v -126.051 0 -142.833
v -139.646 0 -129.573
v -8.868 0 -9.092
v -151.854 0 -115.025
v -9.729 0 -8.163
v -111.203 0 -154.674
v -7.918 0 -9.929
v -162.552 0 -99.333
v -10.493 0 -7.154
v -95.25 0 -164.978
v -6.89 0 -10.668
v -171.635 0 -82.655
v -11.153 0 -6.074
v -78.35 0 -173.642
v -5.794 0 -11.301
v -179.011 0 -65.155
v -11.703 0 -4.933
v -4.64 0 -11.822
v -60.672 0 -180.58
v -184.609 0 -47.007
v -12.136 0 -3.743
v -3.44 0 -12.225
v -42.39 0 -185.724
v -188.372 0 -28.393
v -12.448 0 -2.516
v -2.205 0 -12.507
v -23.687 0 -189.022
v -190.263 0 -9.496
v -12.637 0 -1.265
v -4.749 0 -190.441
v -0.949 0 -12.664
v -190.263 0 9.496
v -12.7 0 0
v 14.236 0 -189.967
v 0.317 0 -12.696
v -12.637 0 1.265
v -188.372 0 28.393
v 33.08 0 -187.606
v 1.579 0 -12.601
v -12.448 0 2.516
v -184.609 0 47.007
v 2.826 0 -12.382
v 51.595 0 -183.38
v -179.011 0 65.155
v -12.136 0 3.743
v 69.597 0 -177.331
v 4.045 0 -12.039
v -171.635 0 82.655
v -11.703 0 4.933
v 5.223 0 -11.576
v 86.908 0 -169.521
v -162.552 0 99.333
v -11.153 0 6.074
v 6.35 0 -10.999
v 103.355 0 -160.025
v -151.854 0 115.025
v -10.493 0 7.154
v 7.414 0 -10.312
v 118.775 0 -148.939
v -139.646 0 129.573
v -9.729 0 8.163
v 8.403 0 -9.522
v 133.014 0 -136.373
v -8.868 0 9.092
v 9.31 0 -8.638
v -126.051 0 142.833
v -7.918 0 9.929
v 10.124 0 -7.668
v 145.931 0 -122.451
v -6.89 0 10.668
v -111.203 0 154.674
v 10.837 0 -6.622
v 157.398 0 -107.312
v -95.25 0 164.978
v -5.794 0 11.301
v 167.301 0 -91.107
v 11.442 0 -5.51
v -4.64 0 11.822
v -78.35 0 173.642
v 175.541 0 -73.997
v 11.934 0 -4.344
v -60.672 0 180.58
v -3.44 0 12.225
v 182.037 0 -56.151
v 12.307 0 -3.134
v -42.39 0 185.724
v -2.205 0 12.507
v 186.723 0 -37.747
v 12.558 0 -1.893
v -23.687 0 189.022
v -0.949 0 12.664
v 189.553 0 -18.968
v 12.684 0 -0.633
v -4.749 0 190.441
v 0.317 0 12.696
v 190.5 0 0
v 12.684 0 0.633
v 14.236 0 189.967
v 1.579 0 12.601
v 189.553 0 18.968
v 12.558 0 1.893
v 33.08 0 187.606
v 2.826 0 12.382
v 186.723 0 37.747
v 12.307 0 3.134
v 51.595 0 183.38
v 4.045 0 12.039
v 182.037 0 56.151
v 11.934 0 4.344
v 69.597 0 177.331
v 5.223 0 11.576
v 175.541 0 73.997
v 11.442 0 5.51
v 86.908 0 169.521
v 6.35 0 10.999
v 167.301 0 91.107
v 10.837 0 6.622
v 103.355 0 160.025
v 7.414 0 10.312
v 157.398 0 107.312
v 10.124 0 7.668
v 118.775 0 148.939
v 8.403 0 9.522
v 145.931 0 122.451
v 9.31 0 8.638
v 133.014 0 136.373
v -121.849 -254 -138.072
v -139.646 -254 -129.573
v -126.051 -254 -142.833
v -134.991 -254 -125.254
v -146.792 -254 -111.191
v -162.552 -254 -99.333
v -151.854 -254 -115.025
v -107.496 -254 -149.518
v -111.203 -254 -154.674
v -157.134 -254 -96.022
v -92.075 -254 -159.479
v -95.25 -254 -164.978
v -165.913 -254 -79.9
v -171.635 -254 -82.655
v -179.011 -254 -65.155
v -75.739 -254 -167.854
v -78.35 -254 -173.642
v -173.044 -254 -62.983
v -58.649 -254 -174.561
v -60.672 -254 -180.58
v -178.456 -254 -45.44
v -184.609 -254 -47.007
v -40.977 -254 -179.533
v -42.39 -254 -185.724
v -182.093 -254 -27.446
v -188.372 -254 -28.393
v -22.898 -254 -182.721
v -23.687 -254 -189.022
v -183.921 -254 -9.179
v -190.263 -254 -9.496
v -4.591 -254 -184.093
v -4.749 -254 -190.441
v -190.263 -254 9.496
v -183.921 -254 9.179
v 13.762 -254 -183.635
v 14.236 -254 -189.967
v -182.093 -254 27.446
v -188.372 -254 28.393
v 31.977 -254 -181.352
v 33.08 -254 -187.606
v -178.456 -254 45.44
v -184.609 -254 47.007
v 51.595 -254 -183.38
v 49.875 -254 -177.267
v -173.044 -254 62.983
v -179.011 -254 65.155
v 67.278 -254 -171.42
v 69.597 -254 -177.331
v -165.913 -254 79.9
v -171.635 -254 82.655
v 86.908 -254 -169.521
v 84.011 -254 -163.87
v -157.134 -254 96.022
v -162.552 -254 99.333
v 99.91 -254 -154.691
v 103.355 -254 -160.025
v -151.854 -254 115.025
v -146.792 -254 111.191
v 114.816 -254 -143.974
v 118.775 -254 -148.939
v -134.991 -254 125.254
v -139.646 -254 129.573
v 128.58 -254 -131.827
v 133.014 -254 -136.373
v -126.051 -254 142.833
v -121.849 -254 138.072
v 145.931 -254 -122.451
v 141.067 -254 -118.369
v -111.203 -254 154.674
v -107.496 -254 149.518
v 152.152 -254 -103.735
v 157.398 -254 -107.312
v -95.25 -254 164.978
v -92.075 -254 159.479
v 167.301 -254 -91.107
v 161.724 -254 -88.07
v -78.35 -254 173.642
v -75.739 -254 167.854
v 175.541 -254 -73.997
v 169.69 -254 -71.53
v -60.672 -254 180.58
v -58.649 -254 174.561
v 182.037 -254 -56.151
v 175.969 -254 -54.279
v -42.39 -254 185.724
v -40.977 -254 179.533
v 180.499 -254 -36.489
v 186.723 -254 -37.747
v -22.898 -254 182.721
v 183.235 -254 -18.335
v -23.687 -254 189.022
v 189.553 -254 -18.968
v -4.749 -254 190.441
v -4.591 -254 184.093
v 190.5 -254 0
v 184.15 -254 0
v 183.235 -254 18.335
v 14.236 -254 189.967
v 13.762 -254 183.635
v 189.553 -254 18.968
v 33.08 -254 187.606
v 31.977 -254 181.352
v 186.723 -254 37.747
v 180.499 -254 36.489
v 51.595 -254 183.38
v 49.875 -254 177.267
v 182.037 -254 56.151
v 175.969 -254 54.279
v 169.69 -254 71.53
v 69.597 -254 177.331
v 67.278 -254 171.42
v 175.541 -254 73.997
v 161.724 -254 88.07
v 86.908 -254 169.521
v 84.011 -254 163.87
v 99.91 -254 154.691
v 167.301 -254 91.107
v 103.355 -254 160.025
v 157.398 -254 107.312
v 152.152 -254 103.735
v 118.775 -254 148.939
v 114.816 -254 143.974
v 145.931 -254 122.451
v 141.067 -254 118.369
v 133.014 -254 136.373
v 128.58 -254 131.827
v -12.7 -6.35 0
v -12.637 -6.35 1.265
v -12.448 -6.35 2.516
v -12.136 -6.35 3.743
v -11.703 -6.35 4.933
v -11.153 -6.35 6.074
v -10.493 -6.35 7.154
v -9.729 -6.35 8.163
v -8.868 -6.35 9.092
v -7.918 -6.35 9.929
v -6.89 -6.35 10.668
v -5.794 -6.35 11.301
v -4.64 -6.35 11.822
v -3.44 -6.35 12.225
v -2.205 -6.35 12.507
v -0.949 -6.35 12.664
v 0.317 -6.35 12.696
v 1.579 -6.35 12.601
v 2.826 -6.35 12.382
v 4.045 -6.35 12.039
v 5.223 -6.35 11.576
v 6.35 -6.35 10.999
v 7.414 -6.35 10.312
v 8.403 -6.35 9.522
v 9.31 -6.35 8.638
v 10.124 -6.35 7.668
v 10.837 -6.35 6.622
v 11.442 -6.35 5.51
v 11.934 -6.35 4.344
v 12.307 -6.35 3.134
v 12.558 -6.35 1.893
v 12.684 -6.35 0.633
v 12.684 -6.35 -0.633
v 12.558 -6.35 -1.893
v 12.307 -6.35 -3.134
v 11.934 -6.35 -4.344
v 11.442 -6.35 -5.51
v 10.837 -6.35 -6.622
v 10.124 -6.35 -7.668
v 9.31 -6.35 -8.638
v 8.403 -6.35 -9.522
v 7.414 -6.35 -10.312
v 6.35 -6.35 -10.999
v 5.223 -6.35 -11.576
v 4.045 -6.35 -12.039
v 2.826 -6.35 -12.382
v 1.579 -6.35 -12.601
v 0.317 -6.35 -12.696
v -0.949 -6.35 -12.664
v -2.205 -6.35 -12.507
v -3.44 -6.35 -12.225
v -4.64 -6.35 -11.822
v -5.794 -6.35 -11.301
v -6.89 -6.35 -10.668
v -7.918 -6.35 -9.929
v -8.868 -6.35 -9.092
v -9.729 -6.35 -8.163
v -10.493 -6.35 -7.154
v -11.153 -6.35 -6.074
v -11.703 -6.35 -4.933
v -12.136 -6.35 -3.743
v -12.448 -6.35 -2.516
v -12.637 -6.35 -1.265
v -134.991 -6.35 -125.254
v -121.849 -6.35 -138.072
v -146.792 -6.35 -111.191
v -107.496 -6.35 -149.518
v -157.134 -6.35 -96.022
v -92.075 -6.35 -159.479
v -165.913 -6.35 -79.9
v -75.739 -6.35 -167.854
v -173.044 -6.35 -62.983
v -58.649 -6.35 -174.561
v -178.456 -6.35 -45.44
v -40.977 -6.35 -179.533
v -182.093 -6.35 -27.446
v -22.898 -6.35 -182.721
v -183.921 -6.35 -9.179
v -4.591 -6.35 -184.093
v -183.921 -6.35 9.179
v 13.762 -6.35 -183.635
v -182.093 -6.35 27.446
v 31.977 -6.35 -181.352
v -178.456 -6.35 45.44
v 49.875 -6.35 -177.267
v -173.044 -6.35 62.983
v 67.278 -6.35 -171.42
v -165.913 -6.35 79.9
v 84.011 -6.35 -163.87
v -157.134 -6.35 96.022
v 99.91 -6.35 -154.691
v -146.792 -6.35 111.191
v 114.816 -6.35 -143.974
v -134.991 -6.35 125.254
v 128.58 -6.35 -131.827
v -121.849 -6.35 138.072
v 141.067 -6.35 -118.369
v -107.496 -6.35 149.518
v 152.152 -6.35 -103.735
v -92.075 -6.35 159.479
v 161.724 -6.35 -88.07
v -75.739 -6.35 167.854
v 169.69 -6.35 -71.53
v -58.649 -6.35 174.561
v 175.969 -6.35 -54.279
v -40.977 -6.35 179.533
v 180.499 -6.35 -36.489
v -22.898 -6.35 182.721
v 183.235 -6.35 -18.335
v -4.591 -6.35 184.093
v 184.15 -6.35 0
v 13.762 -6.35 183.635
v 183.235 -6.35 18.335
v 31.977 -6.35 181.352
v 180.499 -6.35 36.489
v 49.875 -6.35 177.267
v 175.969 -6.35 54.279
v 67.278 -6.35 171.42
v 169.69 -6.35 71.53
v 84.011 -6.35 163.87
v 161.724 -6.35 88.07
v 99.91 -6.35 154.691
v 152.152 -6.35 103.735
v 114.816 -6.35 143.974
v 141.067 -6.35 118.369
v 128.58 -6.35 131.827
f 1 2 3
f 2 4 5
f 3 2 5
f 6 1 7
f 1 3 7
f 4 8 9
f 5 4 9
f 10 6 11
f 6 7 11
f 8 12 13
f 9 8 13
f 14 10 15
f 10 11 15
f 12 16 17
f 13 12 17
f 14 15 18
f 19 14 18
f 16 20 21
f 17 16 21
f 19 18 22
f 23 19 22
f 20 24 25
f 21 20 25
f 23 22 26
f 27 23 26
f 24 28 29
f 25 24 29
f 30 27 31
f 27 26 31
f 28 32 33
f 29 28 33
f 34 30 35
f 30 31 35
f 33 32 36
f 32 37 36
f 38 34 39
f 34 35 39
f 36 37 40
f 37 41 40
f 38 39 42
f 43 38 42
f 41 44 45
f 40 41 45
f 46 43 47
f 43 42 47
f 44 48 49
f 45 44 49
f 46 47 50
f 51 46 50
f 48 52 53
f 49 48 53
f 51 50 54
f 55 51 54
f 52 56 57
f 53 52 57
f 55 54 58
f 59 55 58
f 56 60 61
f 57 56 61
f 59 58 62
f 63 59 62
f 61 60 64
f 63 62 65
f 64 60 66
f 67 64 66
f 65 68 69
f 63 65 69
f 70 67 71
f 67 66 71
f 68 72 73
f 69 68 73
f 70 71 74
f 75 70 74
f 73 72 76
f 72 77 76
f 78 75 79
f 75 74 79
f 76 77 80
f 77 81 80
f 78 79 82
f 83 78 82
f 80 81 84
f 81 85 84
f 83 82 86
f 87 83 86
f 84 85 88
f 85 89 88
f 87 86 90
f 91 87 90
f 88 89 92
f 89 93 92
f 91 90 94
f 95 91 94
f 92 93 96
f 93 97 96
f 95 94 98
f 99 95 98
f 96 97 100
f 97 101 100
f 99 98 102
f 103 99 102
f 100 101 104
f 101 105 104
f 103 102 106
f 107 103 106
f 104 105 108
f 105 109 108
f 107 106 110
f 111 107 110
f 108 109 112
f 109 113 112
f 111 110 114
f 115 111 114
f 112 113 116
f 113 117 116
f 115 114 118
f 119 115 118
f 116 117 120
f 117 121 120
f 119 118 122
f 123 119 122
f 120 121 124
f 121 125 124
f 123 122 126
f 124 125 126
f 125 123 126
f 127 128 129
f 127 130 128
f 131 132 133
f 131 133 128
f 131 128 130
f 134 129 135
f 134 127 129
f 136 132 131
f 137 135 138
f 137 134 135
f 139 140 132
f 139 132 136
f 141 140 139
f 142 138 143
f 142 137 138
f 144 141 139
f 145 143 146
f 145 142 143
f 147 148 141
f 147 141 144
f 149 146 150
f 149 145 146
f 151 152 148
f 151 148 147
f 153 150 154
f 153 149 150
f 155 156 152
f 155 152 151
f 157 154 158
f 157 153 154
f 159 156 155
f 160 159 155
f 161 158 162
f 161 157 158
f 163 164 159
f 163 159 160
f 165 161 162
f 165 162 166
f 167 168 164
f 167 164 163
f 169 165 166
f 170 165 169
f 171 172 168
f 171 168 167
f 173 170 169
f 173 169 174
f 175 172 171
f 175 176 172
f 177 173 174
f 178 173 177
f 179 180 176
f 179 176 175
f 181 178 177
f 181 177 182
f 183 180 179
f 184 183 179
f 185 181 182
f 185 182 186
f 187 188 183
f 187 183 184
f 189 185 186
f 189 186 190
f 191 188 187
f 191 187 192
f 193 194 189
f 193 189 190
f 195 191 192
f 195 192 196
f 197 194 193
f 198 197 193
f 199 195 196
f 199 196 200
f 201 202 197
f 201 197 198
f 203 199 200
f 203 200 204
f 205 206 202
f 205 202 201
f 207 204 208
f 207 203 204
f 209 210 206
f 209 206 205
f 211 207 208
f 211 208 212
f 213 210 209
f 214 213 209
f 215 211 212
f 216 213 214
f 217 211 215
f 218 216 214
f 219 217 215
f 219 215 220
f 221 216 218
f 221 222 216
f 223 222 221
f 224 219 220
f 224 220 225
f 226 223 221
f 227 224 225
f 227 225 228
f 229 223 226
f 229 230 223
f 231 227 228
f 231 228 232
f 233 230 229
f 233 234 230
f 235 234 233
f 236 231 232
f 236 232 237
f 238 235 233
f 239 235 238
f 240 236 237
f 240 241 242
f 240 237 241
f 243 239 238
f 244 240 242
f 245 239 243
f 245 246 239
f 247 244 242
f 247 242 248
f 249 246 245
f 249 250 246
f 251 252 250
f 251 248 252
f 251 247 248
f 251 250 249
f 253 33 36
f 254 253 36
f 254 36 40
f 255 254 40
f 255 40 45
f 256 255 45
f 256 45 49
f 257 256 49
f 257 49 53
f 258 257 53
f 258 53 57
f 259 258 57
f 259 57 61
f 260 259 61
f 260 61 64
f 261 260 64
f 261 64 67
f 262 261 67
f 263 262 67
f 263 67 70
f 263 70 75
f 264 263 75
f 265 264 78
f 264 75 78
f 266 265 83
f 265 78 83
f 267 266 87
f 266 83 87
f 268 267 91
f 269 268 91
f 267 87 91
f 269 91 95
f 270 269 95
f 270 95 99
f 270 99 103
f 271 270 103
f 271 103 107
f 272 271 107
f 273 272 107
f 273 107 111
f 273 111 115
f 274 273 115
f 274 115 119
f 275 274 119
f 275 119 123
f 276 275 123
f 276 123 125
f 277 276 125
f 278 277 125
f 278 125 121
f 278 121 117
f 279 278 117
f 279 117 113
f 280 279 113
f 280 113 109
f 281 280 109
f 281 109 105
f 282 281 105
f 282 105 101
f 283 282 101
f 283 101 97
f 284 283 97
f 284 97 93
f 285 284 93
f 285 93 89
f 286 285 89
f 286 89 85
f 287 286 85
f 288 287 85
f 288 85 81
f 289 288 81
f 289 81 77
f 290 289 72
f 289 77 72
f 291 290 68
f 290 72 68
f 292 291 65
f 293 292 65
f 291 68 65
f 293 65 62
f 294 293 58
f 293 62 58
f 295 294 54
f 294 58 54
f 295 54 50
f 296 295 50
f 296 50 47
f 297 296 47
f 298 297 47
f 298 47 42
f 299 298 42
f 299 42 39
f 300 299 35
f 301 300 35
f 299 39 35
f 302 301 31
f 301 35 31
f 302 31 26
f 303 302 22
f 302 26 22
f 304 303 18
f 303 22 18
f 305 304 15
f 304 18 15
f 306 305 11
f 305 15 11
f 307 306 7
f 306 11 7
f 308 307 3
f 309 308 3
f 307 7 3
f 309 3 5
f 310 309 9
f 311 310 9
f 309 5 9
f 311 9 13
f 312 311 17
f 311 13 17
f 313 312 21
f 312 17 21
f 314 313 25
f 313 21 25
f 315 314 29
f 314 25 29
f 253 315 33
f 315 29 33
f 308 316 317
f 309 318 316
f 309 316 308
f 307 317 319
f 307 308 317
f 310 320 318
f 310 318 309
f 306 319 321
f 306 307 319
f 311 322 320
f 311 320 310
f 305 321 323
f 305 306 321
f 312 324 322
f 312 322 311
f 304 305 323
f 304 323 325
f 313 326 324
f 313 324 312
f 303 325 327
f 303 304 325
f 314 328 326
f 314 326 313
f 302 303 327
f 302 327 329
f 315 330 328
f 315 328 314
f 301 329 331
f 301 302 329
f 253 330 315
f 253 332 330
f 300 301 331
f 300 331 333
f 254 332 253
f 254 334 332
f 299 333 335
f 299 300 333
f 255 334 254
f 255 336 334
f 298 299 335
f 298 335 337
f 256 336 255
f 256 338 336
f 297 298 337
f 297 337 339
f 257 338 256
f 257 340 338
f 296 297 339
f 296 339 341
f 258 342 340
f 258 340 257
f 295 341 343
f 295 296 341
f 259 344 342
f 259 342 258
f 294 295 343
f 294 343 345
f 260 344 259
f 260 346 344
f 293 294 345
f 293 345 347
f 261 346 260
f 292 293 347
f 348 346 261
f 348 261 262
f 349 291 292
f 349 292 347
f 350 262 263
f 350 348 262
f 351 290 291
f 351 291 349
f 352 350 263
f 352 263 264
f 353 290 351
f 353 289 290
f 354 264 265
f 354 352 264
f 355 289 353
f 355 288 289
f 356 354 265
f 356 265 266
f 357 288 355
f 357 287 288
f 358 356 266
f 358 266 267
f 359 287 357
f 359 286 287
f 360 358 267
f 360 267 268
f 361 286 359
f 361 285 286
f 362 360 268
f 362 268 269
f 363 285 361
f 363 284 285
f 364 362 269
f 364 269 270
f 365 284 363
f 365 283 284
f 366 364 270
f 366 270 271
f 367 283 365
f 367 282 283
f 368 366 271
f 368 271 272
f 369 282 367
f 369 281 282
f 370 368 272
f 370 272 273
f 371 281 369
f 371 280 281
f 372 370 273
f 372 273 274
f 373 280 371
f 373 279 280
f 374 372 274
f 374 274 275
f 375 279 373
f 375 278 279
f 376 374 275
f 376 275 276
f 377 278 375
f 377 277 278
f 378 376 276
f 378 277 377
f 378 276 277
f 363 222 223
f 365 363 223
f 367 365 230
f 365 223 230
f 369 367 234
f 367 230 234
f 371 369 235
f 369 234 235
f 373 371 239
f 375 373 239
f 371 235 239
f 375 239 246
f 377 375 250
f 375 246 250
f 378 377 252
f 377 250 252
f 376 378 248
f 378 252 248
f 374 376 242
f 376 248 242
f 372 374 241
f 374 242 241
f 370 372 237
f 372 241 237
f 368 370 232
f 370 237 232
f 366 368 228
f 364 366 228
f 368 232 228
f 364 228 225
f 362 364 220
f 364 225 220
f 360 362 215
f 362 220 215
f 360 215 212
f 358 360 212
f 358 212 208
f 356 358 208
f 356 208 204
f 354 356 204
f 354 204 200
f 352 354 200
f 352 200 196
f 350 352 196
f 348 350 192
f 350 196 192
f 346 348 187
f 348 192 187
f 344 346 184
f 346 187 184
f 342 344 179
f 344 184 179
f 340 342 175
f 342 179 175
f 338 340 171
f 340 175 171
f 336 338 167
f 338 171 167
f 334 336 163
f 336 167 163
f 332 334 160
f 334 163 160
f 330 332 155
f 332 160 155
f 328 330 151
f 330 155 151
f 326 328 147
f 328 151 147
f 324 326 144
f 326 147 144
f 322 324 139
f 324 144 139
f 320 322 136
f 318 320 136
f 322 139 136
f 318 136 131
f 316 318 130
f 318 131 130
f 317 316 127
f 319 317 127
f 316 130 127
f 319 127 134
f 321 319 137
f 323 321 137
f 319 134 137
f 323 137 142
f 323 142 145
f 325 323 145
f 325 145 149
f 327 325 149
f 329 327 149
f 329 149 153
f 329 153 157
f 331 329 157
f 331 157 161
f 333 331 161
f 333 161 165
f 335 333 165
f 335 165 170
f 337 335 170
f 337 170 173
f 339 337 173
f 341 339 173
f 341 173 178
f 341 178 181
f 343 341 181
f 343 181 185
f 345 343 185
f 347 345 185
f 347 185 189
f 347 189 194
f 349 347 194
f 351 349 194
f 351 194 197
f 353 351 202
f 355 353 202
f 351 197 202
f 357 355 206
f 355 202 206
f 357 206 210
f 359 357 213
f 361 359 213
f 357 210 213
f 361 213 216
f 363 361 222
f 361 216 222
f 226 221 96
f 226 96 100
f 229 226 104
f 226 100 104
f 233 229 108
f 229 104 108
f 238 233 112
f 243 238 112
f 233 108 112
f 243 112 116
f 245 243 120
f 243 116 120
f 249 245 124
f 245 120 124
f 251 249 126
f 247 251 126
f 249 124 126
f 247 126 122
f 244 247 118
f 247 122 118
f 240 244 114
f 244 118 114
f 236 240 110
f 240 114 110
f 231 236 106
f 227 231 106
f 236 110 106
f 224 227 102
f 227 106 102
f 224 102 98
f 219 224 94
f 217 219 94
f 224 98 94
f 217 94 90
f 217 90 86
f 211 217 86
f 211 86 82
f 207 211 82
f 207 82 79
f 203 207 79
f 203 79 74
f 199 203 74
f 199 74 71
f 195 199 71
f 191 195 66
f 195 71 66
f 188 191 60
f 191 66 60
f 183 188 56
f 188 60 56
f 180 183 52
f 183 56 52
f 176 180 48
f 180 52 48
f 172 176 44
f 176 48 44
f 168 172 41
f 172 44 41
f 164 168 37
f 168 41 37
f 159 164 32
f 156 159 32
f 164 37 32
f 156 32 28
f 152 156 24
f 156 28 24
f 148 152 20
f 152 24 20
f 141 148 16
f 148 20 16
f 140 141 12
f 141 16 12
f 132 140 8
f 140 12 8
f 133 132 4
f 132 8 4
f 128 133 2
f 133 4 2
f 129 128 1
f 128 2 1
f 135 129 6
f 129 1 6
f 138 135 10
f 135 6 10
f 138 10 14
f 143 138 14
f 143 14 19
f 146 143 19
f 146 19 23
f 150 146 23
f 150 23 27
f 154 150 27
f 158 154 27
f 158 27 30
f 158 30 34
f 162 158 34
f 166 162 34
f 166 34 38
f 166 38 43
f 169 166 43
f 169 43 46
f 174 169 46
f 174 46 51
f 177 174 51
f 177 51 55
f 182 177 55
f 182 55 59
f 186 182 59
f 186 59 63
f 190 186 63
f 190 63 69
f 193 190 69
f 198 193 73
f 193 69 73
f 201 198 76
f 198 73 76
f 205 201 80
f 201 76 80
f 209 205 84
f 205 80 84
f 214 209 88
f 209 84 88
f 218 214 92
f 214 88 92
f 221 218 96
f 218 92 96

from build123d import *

# Parameters (mm, degrees)
F0_R     = 190.5
F1_DEPTH = 254
F2_R     = 184.149995
F3_DEPTH = 247.65
F4_R     = 12.7
F5_DEPTH = 254.001


with BuildPart() as f1:
    # F0 (on Front) → F1 (new body)
    with BuildSketch(Plane.XZ):
        Circle(F0_R)
    extrude(amount=F1_DEPTH)

    # F2 (on face) → F3 (cut)
    with BuildSketch(Plane.XZ.offset(254)):
        Circle(F2_R)
    extrude(amount=-F3_DEPTH, mode=Mode.SUBTRACT)

    # F4 (on face) → F5 (cut, through all)
    with BuildSketch(Plane(origin=(0, 0, 0), x_dir=(-1, 0, 0), z_dir=(0, 1, 0))):
        Circle(F4_R)
    extrude(amount=-F5_DEPTH, mode=Mode.SUBTRACT)


solid = f1.part
